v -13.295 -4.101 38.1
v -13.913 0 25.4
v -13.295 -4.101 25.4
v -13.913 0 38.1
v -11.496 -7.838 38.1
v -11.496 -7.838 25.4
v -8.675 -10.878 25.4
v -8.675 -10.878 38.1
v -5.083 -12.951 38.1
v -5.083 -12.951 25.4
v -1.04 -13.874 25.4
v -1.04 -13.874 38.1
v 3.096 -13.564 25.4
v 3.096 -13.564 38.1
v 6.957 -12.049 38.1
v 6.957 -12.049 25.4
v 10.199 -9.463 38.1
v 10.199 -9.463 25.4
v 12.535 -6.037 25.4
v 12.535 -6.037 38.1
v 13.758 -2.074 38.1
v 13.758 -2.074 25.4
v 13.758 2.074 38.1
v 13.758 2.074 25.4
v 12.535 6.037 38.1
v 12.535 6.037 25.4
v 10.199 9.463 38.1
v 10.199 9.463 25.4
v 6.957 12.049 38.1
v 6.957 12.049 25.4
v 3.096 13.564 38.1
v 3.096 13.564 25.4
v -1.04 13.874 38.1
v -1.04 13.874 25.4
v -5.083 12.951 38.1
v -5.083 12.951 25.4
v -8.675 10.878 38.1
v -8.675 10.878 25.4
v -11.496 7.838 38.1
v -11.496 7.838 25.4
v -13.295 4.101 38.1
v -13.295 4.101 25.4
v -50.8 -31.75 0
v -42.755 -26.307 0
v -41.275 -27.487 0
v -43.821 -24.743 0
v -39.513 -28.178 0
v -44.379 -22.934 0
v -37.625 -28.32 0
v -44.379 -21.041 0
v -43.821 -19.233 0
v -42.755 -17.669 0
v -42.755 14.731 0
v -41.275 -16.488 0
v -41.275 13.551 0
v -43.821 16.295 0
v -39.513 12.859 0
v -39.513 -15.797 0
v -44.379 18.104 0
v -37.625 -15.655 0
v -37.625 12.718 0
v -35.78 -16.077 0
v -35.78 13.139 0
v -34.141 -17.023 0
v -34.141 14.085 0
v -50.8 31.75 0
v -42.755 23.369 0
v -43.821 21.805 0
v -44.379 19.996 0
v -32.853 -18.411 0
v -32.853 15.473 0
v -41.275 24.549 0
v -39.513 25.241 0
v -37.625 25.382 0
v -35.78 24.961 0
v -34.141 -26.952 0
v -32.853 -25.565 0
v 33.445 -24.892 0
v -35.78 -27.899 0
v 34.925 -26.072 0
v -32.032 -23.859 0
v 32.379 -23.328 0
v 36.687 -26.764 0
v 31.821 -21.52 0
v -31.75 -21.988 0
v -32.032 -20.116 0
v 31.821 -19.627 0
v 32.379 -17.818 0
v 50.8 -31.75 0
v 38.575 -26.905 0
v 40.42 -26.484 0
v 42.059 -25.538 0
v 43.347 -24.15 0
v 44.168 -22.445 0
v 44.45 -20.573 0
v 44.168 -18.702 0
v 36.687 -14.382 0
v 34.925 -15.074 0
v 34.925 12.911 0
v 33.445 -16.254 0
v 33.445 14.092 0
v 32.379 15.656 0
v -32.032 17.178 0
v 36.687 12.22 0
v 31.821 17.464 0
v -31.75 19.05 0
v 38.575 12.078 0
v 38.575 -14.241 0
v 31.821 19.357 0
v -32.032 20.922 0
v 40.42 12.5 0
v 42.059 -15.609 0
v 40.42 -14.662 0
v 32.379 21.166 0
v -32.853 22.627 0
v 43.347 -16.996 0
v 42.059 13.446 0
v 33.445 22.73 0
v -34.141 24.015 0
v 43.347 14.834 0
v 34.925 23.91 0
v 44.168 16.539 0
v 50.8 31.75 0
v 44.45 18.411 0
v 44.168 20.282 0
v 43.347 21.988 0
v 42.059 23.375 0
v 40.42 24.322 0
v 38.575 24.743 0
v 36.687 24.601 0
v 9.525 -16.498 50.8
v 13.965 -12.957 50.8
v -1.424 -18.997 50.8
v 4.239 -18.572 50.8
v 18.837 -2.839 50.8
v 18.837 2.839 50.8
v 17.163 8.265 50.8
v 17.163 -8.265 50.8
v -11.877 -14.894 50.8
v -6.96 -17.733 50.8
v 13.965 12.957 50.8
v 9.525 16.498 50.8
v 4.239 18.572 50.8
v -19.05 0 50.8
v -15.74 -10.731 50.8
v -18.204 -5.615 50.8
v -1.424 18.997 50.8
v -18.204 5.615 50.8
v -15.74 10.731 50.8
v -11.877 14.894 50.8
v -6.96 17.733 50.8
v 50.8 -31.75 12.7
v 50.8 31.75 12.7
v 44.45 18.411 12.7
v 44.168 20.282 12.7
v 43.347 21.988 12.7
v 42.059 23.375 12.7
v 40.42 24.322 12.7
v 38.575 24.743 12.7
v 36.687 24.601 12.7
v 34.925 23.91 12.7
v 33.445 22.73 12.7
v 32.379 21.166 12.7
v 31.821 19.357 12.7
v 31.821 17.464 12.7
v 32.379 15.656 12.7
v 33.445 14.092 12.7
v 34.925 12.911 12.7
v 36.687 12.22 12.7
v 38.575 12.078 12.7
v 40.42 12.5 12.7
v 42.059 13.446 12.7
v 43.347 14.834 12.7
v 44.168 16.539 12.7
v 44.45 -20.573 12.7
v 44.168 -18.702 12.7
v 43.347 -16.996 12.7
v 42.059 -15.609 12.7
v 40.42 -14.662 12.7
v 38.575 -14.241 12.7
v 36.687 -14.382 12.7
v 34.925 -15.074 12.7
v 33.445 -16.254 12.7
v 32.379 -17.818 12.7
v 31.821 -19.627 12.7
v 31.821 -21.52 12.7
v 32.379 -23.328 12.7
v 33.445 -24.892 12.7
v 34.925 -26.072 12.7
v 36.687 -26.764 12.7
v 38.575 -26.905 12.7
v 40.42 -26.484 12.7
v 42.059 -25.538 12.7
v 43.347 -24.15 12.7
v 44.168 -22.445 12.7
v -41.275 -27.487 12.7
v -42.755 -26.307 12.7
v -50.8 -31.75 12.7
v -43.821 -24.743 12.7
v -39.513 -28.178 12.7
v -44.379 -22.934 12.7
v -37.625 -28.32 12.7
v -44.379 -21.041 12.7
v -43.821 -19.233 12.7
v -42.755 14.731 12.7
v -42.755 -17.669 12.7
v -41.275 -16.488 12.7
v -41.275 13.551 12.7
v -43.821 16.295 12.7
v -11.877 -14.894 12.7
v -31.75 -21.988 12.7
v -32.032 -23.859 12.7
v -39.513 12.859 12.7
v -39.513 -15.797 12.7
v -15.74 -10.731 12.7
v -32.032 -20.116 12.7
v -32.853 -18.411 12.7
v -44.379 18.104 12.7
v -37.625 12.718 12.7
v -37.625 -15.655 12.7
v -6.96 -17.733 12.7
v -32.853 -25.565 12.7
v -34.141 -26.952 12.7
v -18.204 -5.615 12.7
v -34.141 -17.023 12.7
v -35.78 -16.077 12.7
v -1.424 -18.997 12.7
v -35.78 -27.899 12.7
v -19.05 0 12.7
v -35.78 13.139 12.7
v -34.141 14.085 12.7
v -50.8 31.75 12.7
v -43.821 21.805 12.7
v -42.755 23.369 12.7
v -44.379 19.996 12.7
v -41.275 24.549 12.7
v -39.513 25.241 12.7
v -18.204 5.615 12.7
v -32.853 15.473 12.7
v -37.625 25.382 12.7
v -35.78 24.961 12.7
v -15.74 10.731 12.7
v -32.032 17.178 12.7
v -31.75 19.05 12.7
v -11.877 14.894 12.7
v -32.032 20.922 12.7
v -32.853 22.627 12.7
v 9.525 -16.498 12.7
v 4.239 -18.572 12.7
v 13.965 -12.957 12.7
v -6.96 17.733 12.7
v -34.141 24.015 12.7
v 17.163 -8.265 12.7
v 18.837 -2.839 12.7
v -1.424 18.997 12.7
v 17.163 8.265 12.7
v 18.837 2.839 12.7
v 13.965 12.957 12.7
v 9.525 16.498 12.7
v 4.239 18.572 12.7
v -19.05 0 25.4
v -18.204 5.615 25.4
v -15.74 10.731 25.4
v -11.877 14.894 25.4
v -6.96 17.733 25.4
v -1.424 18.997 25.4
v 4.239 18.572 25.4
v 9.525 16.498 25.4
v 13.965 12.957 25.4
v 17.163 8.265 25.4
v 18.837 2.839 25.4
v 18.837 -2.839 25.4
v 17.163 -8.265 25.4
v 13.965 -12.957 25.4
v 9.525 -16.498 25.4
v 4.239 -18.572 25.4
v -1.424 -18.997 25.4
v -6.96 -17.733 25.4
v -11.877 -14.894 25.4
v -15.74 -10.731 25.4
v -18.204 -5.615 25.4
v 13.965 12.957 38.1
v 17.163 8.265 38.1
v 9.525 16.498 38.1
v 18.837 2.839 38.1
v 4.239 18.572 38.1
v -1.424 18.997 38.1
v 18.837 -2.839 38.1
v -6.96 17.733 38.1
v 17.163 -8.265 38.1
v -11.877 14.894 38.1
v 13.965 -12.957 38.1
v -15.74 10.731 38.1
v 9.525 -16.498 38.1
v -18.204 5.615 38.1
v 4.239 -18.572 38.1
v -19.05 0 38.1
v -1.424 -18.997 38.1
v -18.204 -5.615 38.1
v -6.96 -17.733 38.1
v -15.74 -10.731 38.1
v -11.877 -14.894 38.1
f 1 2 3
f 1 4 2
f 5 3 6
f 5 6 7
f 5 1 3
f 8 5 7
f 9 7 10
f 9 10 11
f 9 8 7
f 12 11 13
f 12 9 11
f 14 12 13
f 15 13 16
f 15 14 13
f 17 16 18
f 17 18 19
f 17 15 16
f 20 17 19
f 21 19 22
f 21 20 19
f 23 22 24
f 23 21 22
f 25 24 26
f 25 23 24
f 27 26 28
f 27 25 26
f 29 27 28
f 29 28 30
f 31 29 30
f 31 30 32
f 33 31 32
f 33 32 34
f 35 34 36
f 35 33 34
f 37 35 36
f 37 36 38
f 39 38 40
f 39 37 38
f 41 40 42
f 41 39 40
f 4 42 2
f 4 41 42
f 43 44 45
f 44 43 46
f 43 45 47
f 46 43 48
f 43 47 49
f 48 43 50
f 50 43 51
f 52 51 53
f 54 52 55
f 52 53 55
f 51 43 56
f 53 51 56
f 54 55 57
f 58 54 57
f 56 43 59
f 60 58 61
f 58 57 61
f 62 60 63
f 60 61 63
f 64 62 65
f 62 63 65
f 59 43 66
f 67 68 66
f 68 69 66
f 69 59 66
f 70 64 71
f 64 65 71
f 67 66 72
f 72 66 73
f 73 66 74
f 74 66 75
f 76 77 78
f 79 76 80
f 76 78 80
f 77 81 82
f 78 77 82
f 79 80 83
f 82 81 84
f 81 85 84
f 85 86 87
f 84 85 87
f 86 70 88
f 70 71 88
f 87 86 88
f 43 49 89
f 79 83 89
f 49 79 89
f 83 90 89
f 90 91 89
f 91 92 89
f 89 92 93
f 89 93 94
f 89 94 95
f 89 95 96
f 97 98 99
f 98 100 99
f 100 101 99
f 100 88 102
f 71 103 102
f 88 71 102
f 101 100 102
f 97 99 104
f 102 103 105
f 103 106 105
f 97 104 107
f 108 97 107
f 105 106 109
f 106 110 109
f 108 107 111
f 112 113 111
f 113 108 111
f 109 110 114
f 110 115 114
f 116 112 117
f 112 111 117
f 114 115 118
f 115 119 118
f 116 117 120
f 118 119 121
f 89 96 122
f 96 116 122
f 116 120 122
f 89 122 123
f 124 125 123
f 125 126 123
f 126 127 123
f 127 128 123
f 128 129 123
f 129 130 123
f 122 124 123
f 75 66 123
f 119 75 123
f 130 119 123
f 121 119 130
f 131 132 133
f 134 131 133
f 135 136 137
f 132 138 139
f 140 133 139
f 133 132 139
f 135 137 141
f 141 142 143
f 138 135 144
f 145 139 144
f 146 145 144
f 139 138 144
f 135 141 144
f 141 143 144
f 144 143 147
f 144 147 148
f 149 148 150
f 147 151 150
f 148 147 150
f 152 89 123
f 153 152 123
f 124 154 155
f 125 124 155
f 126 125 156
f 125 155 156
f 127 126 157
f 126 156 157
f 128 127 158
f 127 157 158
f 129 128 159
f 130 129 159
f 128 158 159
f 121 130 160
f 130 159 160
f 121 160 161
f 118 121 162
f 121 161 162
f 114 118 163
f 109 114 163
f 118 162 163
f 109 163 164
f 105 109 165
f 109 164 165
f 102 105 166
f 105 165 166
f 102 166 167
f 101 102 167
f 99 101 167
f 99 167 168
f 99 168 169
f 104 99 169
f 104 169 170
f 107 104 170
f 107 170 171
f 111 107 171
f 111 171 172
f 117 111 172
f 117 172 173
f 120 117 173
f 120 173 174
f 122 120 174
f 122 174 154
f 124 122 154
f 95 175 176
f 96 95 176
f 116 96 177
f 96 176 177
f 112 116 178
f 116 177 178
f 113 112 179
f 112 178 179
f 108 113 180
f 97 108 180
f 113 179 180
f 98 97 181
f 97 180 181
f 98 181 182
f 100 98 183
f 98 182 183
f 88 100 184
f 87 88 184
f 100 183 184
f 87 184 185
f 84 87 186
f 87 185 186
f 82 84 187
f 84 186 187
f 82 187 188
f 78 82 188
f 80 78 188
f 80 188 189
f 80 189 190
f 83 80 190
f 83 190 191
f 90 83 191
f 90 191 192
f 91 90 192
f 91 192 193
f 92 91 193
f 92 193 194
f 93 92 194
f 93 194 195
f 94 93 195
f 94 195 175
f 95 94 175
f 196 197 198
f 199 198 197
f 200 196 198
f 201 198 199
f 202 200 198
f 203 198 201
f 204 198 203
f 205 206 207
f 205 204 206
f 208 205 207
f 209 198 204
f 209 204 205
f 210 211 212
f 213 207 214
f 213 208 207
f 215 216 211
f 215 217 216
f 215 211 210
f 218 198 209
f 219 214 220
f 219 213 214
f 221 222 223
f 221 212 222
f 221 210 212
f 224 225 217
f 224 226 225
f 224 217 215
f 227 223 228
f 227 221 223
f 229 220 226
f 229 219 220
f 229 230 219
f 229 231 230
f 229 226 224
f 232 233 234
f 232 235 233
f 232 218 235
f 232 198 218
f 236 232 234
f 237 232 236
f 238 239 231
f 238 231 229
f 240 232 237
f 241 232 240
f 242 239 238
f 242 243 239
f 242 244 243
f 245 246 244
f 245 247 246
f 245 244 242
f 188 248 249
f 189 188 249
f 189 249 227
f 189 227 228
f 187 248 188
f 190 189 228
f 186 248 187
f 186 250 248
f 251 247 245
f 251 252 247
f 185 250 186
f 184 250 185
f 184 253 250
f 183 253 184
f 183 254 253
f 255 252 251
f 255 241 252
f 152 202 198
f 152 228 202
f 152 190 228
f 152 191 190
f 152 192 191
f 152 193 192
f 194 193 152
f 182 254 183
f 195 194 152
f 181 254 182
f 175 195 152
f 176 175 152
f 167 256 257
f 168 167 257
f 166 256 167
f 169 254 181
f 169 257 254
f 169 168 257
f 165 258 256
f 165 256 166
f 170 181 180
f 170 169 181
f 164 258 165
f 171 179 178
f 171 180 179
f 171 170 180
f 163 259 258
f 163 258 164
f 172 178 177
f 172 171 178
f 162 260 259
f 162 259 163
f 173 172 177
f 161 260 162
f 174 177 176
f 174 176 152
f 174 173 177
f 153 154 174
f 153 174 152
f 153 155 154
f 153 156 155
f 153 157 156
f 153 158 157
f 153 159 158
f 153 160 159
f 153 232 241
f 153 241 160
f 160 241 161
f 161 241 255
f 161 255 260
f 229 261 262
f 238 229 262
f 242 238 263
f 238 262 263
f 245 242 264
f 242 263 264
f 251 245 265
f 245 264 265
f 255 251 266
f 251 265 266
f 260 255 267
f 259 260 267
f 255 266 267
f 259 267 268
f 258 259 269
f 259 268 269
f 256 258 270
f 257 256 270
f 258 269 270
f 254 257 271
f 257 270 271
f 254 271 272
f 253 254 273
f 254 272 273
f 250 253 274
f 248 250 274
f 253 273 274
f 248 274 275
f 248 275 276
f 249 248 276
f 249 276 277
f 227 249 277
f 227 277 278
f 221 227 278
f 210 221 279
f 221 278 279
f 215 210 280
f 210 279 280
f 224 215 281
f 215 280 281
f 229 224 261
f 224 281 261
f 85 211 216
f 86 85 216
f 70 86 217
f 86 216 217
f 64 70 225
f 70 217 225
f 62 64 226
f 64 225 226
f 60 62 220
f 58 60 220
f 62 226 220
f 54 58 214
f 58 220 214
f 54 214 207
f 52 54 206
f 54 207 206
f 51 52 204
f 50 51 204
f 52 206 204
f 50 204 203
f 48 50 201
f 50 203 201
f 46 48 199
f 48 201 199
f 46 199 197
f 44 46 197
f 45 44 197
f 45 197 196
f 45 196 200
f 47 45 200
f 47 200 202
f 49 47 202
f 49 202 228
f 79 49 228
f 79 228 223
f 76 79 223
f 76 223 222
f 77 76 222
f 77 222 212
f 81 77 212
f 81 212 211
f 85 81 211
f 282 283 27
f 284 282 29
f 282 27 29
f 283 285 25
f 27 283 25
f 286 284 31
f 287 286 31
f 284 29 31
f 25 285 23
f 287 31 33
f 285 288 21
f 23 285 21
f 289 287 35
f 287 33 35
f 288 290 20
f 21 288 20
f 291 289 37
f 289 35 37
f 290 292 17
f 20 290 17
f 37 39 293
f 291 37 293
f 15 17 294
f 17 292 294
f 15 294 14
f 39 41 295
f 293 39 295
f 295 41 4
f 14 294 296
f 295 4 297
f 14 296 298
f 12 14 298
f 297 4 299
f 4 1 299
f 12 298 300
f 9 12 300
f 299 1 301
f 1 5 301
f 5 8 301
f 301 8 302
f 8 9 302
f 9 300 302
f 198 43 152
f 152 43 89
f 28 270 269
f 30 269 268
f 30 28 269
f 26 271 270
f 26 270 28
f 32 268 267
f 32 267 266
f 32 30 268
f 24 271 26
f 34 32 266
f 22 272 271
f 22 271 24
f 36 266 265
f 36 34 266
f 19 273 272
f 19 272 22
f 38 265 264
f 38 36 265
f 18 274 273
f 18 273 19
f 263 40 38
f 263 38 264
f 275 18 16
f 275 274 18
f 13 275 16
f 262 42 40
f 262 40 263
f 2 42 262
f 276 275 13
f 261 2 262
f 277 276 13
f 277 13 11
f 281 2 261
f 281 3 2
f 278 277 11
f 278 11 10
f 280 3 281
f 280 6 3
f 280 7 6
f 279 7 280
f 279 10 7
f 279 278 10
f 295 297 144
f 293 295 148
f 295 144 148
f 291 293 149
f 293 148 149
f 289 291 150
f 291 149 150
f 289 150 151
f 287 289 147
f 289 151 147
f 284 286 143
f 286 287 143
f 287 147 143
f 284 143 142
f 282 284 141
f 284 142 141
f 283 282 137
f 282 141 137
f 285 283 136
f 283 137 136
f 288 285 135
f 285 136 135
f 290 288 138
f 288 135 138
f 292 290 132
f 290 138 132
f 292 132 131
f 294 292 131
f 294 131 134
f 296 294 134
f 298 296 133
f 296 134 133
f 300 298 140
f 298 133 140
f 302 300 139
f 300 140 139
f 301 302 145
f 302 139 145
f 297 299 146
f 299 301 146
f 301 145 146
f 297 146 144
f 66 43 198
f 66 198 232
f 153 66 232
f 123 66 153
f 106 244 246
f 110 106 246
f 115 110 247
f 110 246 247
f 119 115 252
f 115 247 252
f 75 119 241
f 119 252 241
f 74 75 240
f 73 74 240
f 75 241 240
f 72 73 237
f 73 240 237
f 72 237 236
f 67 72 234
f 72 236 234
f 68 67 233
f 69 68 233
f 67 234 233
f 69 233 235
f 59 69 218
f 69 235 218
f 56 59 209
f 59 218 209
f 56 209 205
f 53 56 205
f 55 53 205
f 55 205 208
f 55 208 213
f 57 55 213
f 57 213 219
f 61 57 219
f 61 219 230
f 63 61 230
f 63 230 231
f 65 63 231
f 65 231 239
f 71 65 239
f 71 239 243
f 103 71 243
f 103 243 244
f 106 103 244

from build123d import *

# Parameters (mm, degrees)
F0_W     = 101.6
F0_H     = 63.5
F1_DEPTH = 12.7
F2_R     = 6.35
F3_DEPTH = 12.701
F4_W     = 19.05
F4_H     = 38.1
F6_W     = 11.628822
F6_H     = 12.7


with BuildPart() as f1:
    # F0 (on Top) → F1 (new body)
    with BuildSketch(Plane.XY):
        Rectangle(F0_W, F0_H)
    extrude(amount=F1_DEPTH)

    # F2 (on face) → F3 (cut, through all)
    with BuildSketch(Plane.XY.offset(12.7)):
        with Locations((-38.1, 19.05)):
            Circle(F2_R)
        with Locations((-38.1, -21.987695)):
            Circle(F2_R)
        with Locations((38.1, 18.410703)):
            Circle(F2_R)
        with Locations((38.1, -20.573199)):
            Circle(F2_R)
    extrude(amount=-F3_DEPTH, mode=Mode.SUBTRACT)

    # F4 (on Front) → F5 (revolve)
    with BuildSketch(Plane.XZ):
        with Locations((-9.525, 31.75)):
            Rectangle(F4_W, F4_H)
    revolve(axis=Axis((0, 0, 31.75), (0, 0, -1)))

    # F6 (on Front) → F7 (revolve, cut)
    with BuildSketch(Plane.XZ):
        with Locations((-19.727555, 31.75)):
            Rectangle(F6_W, F6_H)
    revolve(axis=Axis((0, 0, 28.649839), (0, 0, 1)), mode=Mode.SUBTRACT)


solid = f1.part
